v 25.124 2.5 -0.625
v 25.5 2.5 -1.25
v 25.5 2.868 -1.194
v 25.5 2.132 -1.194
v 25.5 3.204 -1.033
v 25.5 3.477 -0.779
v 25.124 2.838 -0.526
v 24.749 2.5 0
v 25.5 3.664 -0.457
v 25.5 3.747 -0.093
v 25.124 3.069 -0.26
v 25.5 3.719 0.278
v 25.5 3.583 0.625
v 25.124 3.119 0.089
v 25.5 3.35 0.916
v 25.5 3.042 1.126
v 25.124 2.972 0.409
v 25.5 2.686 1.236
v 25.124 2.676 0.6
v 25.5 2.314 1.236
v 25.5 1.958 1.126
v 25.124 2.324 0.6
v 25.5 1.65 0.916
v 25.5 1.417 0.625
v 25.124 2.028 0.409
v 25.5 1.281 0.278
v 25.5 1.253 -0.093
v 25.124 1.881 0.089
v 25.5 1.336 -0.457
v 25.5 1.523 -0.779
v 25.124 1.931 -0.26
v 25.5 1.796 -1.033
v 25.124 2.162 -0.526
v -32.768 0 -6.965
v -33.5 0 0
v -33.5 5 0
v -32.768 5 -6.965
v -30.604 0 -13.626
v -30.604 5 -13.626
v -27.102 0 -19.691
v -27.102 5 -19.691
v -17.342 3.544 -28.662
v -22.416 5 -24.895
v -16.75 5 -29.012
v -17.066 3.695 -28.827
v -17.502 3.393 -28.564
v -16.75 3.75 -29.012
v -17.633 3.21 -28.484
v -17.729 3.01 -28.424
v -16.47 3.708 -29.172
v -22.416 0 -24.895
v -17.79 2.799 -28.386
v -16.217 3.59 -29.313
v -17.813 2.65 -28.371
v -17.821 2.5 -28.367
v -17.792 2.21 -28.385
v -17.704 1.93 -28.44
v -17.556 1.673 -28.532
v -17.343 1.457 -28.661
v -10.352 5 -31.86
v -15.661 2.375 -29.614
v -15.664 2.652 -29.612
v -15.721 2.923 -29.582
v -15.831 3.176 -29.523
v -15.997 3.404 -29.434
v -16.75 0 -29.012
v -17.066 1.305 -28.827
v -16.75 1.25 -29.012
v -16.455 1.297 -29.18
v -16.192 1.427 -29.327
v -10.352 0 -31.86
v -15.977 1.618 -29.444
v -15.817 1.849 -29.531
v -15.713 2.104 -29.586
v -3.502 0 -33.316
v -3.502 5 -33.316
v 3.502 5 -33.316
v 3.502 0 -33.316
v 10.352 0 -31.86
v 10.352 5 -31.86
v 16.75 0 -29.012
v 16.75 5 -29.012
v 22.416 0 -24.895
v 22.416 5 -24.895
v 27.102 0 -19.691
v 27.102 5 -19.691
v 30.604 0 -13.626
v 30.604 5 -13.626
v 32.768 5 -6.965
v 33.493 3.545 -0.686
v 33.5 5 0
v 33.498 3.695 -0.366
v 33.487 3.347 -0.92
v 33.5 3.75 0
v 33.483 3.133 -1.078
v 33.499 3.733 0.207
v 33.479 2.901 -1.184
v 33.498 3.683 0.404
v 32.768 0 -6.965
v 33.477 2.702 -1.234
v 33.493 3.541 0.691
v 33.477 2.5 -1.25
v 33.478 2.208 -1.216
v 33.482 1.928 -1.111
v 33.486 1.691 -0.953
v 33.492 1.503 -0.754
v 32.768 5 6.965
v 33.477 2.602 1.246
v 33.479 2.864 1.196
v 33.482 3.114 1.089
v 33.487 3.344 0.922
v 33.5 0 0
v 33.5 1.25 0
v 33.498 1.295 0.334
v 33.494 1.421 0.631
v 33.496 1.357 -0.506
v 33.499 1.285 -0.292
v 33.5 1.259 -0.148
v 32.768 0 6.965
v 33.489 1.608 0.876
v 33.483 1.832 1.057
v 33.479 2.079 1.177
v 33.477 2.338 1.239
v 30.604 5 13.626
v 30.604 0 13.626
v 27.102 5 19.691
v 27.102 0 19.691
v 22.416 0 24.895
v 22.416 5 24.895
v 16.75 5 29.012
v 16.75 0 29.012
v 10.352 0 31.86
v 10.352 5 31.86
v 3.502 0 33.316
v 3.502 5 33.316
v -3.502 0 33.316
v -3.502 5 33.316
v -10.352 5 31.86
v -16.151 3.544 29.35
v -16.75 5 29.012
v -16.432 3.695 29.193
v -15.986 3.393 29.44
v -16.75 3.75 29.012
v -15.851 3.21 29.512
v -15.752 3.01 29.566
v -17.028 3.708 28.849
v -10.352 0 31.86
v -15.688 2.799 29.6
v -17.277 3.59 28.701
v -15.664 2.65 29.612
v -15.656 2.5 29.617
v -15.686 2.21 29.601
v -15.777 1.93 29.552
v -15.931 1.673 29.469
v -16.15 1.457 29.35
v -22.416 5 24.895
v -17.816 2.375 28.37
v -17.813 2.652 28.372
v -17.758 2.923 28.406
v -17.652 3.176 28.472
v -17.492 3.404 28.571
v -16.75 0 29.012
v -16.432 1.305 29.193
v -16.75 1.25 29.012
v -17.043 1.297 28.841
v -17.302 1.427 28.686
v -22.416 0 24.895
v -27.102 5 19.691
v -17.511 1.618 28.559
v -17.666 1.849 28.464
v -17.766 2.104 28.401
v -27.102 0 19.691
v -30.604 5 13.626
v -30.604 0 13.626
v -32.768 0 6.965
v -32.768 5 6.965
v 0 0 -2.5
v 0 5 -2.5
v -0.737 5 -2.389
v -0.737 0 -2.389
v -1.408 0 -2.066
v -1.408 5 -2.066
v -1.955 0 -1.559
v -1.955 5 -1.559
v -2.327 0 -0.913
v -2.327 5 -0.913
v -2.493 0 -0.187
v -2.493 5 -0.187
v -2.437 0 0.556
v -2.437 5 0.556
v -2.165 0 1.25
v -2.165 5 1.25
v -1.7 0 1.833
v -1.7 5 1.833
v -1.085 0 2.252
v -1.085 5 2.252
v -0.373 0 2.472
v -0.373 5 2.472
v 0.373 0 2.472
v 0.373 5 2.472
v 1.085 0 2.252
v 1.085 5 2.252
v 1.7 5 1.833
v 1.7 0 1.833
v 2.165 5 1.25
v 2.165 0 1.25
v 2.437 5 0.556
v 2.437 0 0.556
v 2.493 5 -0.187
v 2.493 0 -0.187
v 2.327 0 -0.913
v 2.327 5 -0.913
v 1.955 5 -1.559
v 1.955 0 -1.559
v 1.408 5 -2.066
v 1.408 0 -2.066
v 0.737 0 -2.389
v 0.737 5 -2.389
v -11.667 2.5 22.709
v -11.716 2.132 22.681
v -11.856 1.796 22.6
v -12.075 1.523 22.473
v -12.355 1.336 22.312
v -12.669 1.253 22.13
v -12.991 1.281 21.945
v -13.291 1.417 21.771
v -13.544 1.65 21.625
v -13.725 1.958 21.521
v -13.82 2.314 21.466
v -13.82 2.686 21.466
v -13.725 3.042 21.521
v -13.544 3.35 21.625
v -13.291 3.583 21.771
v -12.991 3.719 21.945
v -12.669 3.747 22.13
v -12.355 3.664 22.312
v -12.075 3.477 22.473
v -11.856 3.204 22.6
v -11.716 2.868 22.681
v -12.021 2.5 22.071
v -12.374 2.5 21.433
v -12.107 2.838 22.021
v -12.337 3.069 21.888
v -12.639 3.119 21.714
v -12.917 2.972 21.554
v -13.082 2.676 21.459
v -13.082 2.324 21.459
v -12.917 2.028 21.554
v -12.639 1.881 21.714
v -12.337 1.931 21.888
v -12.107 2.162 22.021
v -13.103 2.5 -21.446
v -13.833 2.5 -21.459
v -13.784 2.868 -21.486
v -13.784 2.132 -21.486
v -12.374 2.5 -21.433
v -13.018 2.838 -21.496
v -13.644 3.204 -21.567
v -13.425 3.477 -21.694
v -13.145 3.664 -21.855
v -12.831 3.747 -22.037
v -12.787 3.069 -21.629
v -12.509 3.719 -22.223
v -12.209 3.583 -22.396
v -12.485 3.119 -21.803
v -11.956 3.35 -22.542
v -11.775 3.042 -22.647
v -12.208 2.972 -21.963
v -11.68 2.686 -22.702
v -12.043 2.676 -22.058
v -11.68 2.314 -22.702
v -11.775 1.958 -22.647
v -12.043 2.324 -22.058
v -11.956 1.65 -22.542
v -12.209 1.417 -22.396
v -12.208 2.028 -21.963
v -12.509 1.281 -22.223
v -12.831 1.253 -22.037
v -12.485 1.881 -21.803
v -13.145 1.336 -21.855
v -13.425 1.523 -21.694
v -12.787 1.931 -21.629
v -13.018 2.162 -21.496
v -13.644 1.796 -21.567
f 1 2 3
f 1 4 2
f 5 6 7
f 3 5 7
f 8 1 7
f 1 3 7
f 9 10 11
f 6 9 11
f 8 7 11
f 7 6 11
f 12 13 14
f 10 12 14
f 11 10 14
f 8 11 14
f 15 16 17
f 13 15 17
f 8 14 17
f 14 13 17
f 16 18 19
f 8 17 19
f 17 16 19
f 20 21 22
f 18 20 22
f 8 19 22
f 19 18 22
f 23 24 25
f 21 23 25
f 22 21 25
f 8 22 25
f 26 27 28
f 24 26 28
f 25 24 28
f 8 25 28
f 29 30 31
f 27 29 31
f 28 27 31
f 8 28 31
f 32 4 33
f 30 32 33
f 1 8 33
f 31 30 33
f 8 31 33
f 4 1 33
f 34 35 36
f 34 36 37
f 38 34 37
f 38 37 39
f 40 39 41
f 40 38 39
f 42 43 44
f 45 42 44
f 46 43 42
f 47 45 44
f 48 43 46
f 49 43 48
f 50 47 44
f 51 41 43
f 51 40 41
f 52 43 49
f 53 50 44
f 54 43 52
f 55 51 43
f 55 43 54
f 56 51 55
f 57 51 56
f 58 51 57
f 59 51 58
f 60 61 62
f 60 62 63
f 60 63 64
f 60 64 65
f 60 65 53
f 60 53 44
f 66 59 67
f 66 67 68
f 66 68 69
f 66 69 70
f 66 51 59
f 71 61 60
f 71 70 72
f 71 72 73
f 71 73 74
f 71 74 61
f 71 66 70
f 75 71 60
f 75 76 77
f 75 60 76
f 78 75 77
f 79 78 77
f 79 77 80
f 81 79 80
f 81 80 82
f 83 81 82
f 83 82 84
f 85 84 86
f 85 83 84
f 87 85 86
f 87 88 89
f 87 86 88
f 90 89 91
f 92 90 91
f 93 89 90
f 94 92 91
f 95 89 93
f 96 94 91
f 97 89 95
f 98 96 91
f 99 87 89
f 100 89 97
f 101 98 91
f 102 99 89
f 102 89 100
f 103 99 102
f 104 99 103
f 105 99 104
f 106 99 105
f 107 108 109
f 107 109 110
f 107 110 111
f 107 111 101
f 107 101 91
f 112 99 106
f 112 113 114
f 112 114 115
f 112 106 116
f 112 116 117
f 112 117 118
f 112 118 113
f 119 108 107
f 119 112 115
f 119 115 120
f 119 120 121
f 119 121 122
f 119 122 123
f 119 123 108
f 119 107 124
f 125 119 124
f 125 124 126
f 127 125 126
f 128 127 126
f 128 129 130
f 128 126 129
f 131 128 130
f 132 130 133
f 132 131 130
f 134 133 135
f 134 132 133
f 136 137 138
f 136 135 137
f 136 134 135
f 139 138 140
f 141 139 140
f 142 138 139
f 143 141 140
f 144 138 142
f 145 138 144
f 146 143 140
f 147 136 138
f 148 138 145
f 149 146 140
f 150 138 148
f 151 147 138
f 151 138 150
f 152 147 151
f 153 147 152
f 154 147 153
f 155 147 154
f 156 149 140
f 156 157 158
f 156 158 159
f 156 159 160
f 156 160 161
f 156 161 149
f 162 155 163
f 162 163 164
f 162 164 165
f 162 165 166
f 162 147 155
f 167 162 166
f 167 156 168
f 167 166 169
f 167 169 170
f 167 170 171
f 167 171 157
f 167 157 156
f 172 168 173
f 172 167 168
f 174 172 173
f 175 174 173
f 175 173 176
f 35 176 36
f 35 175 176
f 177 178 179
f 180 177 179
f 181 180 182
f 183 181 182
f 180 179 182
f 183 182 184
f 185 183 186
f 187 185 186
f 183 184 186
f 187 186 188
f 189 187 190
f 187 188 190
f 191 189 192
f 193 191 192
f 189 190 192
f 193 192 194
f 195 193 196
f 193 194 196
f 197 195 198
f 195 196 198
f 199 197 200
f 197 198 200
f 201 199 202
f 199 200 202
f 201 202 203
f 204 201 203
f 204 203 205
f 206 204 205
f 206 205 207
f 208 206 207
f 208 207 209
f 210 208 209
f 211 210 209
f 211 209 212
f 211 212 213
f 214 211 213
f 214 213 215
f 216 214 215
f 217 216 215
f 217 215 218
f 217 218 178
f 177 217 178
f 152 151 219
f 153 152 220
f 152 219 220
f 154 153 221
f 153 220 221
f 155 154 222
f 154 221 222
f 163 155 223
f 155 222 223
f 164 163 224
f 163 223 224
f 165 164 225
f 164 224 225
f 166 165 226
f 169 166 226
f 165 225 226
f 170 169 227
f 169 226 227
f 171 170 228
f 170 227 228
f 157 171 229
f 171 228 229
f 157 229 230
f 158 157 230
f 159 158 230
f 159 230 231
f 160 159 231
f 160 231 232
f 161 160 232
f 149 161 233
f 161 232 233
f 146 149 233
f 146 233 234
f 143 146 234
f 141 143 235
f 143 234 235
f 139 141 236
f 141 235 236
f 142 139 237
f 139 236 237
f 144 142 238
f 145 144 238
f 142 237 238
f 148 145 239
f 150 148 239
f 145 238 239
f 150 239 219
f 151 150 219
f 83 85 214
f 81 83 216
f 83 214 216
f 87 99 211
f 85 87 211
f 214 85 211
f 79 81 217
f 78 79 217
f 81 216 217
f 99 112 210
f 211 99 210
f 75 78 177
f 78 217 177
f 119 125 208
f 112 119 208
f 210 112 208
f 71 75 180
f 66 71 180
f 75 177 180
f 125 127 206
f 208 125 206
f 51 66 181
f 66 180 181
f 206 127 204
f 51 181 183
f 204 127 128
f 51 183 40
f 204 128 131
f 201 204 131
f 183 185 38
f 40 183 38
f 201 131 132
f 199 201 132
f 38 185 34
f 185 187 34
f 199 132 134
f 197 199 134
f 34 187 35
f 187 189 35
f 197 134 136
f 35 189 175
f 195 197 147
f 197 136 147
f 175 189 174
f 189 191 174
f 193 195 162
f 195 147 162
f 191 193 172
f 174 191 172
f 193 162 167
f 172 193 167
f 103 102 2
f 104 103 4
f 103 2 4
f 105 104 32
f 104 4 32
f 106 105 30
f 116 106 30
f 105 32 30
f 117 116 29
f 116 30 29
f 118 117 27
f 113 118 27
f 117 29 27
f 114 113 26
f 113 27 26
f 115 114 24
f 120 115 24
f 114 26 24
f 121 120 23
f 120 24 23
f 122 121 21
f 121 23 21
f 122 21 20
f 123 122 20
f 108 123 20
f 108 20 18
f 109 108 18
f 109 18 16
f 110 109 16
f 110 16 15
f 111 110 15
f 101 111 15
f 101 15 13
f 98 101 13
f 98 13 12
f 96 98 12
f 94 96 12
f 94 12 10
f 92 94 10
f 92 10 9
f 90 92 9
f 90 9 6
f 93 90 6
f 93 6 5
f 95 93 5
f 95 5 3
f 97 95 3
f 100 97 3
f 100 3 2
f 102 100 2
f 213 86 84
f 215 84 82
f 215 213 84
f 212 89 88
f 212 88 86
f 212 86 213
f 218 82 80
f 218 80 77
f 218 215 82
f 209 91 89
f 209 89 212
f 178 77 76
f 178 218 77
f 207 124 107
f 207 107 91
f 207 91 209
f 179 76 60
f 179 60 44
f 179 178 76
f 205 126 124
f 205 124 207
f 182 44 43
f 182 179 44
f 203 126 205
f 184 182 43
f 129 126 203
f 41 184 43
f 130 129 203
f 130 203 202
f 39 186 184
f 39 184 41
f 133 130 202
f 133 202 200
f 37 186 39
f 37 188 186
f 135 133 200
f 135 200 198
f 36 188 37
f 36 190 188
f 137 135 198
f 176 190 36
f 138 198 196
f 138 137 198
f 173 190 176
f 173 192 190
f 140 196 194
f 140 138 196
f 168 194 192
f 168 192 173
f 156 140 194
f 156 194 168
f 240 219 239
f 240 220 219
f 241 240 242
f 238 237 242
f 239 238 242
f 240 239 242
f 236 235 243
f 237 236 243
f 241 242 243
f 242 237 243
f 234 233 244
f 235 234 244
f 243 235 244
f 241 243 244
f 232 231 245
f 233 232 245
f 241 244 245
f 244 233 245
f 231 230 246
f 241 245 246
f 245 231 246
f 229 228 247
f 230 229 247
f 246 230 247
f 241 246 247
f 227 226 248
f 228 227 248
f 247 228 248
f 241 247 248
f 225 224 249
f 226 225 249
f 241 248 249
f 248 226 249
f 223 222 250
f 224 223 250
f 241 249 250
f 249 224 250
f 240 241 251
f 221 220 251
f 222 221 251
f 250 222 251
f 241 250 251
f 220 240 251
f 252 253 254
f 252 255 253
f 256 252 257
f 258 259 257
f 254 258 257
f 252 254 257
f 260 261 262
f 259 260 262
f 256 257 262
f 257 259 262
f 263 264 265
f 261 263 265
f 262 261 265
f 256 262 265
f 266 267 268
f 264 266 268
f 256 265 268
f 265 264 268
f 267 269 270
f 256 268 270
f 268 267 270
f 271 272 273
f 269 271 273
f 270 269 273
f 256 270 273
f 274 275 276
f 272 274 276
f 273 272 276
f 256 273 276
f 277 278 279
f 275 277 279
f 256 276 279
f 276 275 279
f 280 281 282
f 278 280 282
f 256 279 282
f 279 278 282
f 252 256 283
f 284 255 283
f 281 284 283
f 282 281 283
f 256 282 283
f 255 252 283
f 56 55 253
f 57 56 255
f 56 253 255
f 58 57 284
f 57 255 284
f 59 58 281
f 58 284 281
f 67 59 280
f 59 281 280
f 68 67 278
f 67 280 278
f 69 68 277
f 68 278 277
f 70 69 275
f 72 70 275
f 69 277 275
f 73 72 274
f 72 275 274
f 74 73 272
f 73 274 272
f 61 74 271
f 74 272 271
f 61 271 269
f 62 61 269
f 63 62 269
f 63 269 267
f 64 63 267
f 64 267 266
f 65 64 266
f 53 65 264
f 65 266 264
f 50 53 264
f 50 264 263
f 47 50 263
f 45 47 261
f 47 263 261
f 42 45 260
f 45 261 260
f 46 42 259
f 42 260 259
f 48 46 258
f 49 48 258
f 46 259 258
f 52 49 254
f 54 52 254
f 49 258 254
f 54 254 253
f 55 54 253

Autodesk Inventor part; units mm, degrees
ref_plane "XZ Plane" through (0, 0, 0) normal (0, 1, 0) x (-1, 0, 0)
ref_plane "XY Plane" through (0, 0, 0) normal (0, 0, 1) x (1, 0, 0)
sketch "Sketch1" plane through (0, 0, 0) normal (0, 1, 0) x (-1, 0, 0)
  circle A0 centre (0, 0) radius 33.5
  dimension "d0" = 67
extrude "Extrusion1" add sketch "Sketch1" along normal blind 5
ref_plane "Work Plane1" through (33.5, 0, 0) normal (1, 0, 0) x (0, 1, 0)
sketch "Sketch2" plane through (33.5, 0, 0) normal (1, 0, 0) x (0, 1, 0)
  line L0 (0, -33.5) -> (0, 33.5) projected
  point P0 (0, 0)
  point P1 (2.5, 0)
  dimension "d4" = 2.5
hole "Hole1" at (33.5, 2.5, 0) direction (-1, 0, 0) diameter 2.5 depth 8 tip angle 118
pattern_circular "Circular Pattern1" count 3 over 360 about axis through (0, 0, 0) along (0, 1, 0) of "Hole1"
sketch "Sketch3" plane through (0, 0, 0) normal (0, -1, 0) x (1, 0, 0)
  point P0 (0, 0)
  point P1 (0, 0)
hole "Hole2" at (0, 0, 0) direction (0, 1, 0) diameter 5 depth 8 tip angle 118
properties part number "Engine bulkhead" material "Steel AISI 1006 85 HR"
